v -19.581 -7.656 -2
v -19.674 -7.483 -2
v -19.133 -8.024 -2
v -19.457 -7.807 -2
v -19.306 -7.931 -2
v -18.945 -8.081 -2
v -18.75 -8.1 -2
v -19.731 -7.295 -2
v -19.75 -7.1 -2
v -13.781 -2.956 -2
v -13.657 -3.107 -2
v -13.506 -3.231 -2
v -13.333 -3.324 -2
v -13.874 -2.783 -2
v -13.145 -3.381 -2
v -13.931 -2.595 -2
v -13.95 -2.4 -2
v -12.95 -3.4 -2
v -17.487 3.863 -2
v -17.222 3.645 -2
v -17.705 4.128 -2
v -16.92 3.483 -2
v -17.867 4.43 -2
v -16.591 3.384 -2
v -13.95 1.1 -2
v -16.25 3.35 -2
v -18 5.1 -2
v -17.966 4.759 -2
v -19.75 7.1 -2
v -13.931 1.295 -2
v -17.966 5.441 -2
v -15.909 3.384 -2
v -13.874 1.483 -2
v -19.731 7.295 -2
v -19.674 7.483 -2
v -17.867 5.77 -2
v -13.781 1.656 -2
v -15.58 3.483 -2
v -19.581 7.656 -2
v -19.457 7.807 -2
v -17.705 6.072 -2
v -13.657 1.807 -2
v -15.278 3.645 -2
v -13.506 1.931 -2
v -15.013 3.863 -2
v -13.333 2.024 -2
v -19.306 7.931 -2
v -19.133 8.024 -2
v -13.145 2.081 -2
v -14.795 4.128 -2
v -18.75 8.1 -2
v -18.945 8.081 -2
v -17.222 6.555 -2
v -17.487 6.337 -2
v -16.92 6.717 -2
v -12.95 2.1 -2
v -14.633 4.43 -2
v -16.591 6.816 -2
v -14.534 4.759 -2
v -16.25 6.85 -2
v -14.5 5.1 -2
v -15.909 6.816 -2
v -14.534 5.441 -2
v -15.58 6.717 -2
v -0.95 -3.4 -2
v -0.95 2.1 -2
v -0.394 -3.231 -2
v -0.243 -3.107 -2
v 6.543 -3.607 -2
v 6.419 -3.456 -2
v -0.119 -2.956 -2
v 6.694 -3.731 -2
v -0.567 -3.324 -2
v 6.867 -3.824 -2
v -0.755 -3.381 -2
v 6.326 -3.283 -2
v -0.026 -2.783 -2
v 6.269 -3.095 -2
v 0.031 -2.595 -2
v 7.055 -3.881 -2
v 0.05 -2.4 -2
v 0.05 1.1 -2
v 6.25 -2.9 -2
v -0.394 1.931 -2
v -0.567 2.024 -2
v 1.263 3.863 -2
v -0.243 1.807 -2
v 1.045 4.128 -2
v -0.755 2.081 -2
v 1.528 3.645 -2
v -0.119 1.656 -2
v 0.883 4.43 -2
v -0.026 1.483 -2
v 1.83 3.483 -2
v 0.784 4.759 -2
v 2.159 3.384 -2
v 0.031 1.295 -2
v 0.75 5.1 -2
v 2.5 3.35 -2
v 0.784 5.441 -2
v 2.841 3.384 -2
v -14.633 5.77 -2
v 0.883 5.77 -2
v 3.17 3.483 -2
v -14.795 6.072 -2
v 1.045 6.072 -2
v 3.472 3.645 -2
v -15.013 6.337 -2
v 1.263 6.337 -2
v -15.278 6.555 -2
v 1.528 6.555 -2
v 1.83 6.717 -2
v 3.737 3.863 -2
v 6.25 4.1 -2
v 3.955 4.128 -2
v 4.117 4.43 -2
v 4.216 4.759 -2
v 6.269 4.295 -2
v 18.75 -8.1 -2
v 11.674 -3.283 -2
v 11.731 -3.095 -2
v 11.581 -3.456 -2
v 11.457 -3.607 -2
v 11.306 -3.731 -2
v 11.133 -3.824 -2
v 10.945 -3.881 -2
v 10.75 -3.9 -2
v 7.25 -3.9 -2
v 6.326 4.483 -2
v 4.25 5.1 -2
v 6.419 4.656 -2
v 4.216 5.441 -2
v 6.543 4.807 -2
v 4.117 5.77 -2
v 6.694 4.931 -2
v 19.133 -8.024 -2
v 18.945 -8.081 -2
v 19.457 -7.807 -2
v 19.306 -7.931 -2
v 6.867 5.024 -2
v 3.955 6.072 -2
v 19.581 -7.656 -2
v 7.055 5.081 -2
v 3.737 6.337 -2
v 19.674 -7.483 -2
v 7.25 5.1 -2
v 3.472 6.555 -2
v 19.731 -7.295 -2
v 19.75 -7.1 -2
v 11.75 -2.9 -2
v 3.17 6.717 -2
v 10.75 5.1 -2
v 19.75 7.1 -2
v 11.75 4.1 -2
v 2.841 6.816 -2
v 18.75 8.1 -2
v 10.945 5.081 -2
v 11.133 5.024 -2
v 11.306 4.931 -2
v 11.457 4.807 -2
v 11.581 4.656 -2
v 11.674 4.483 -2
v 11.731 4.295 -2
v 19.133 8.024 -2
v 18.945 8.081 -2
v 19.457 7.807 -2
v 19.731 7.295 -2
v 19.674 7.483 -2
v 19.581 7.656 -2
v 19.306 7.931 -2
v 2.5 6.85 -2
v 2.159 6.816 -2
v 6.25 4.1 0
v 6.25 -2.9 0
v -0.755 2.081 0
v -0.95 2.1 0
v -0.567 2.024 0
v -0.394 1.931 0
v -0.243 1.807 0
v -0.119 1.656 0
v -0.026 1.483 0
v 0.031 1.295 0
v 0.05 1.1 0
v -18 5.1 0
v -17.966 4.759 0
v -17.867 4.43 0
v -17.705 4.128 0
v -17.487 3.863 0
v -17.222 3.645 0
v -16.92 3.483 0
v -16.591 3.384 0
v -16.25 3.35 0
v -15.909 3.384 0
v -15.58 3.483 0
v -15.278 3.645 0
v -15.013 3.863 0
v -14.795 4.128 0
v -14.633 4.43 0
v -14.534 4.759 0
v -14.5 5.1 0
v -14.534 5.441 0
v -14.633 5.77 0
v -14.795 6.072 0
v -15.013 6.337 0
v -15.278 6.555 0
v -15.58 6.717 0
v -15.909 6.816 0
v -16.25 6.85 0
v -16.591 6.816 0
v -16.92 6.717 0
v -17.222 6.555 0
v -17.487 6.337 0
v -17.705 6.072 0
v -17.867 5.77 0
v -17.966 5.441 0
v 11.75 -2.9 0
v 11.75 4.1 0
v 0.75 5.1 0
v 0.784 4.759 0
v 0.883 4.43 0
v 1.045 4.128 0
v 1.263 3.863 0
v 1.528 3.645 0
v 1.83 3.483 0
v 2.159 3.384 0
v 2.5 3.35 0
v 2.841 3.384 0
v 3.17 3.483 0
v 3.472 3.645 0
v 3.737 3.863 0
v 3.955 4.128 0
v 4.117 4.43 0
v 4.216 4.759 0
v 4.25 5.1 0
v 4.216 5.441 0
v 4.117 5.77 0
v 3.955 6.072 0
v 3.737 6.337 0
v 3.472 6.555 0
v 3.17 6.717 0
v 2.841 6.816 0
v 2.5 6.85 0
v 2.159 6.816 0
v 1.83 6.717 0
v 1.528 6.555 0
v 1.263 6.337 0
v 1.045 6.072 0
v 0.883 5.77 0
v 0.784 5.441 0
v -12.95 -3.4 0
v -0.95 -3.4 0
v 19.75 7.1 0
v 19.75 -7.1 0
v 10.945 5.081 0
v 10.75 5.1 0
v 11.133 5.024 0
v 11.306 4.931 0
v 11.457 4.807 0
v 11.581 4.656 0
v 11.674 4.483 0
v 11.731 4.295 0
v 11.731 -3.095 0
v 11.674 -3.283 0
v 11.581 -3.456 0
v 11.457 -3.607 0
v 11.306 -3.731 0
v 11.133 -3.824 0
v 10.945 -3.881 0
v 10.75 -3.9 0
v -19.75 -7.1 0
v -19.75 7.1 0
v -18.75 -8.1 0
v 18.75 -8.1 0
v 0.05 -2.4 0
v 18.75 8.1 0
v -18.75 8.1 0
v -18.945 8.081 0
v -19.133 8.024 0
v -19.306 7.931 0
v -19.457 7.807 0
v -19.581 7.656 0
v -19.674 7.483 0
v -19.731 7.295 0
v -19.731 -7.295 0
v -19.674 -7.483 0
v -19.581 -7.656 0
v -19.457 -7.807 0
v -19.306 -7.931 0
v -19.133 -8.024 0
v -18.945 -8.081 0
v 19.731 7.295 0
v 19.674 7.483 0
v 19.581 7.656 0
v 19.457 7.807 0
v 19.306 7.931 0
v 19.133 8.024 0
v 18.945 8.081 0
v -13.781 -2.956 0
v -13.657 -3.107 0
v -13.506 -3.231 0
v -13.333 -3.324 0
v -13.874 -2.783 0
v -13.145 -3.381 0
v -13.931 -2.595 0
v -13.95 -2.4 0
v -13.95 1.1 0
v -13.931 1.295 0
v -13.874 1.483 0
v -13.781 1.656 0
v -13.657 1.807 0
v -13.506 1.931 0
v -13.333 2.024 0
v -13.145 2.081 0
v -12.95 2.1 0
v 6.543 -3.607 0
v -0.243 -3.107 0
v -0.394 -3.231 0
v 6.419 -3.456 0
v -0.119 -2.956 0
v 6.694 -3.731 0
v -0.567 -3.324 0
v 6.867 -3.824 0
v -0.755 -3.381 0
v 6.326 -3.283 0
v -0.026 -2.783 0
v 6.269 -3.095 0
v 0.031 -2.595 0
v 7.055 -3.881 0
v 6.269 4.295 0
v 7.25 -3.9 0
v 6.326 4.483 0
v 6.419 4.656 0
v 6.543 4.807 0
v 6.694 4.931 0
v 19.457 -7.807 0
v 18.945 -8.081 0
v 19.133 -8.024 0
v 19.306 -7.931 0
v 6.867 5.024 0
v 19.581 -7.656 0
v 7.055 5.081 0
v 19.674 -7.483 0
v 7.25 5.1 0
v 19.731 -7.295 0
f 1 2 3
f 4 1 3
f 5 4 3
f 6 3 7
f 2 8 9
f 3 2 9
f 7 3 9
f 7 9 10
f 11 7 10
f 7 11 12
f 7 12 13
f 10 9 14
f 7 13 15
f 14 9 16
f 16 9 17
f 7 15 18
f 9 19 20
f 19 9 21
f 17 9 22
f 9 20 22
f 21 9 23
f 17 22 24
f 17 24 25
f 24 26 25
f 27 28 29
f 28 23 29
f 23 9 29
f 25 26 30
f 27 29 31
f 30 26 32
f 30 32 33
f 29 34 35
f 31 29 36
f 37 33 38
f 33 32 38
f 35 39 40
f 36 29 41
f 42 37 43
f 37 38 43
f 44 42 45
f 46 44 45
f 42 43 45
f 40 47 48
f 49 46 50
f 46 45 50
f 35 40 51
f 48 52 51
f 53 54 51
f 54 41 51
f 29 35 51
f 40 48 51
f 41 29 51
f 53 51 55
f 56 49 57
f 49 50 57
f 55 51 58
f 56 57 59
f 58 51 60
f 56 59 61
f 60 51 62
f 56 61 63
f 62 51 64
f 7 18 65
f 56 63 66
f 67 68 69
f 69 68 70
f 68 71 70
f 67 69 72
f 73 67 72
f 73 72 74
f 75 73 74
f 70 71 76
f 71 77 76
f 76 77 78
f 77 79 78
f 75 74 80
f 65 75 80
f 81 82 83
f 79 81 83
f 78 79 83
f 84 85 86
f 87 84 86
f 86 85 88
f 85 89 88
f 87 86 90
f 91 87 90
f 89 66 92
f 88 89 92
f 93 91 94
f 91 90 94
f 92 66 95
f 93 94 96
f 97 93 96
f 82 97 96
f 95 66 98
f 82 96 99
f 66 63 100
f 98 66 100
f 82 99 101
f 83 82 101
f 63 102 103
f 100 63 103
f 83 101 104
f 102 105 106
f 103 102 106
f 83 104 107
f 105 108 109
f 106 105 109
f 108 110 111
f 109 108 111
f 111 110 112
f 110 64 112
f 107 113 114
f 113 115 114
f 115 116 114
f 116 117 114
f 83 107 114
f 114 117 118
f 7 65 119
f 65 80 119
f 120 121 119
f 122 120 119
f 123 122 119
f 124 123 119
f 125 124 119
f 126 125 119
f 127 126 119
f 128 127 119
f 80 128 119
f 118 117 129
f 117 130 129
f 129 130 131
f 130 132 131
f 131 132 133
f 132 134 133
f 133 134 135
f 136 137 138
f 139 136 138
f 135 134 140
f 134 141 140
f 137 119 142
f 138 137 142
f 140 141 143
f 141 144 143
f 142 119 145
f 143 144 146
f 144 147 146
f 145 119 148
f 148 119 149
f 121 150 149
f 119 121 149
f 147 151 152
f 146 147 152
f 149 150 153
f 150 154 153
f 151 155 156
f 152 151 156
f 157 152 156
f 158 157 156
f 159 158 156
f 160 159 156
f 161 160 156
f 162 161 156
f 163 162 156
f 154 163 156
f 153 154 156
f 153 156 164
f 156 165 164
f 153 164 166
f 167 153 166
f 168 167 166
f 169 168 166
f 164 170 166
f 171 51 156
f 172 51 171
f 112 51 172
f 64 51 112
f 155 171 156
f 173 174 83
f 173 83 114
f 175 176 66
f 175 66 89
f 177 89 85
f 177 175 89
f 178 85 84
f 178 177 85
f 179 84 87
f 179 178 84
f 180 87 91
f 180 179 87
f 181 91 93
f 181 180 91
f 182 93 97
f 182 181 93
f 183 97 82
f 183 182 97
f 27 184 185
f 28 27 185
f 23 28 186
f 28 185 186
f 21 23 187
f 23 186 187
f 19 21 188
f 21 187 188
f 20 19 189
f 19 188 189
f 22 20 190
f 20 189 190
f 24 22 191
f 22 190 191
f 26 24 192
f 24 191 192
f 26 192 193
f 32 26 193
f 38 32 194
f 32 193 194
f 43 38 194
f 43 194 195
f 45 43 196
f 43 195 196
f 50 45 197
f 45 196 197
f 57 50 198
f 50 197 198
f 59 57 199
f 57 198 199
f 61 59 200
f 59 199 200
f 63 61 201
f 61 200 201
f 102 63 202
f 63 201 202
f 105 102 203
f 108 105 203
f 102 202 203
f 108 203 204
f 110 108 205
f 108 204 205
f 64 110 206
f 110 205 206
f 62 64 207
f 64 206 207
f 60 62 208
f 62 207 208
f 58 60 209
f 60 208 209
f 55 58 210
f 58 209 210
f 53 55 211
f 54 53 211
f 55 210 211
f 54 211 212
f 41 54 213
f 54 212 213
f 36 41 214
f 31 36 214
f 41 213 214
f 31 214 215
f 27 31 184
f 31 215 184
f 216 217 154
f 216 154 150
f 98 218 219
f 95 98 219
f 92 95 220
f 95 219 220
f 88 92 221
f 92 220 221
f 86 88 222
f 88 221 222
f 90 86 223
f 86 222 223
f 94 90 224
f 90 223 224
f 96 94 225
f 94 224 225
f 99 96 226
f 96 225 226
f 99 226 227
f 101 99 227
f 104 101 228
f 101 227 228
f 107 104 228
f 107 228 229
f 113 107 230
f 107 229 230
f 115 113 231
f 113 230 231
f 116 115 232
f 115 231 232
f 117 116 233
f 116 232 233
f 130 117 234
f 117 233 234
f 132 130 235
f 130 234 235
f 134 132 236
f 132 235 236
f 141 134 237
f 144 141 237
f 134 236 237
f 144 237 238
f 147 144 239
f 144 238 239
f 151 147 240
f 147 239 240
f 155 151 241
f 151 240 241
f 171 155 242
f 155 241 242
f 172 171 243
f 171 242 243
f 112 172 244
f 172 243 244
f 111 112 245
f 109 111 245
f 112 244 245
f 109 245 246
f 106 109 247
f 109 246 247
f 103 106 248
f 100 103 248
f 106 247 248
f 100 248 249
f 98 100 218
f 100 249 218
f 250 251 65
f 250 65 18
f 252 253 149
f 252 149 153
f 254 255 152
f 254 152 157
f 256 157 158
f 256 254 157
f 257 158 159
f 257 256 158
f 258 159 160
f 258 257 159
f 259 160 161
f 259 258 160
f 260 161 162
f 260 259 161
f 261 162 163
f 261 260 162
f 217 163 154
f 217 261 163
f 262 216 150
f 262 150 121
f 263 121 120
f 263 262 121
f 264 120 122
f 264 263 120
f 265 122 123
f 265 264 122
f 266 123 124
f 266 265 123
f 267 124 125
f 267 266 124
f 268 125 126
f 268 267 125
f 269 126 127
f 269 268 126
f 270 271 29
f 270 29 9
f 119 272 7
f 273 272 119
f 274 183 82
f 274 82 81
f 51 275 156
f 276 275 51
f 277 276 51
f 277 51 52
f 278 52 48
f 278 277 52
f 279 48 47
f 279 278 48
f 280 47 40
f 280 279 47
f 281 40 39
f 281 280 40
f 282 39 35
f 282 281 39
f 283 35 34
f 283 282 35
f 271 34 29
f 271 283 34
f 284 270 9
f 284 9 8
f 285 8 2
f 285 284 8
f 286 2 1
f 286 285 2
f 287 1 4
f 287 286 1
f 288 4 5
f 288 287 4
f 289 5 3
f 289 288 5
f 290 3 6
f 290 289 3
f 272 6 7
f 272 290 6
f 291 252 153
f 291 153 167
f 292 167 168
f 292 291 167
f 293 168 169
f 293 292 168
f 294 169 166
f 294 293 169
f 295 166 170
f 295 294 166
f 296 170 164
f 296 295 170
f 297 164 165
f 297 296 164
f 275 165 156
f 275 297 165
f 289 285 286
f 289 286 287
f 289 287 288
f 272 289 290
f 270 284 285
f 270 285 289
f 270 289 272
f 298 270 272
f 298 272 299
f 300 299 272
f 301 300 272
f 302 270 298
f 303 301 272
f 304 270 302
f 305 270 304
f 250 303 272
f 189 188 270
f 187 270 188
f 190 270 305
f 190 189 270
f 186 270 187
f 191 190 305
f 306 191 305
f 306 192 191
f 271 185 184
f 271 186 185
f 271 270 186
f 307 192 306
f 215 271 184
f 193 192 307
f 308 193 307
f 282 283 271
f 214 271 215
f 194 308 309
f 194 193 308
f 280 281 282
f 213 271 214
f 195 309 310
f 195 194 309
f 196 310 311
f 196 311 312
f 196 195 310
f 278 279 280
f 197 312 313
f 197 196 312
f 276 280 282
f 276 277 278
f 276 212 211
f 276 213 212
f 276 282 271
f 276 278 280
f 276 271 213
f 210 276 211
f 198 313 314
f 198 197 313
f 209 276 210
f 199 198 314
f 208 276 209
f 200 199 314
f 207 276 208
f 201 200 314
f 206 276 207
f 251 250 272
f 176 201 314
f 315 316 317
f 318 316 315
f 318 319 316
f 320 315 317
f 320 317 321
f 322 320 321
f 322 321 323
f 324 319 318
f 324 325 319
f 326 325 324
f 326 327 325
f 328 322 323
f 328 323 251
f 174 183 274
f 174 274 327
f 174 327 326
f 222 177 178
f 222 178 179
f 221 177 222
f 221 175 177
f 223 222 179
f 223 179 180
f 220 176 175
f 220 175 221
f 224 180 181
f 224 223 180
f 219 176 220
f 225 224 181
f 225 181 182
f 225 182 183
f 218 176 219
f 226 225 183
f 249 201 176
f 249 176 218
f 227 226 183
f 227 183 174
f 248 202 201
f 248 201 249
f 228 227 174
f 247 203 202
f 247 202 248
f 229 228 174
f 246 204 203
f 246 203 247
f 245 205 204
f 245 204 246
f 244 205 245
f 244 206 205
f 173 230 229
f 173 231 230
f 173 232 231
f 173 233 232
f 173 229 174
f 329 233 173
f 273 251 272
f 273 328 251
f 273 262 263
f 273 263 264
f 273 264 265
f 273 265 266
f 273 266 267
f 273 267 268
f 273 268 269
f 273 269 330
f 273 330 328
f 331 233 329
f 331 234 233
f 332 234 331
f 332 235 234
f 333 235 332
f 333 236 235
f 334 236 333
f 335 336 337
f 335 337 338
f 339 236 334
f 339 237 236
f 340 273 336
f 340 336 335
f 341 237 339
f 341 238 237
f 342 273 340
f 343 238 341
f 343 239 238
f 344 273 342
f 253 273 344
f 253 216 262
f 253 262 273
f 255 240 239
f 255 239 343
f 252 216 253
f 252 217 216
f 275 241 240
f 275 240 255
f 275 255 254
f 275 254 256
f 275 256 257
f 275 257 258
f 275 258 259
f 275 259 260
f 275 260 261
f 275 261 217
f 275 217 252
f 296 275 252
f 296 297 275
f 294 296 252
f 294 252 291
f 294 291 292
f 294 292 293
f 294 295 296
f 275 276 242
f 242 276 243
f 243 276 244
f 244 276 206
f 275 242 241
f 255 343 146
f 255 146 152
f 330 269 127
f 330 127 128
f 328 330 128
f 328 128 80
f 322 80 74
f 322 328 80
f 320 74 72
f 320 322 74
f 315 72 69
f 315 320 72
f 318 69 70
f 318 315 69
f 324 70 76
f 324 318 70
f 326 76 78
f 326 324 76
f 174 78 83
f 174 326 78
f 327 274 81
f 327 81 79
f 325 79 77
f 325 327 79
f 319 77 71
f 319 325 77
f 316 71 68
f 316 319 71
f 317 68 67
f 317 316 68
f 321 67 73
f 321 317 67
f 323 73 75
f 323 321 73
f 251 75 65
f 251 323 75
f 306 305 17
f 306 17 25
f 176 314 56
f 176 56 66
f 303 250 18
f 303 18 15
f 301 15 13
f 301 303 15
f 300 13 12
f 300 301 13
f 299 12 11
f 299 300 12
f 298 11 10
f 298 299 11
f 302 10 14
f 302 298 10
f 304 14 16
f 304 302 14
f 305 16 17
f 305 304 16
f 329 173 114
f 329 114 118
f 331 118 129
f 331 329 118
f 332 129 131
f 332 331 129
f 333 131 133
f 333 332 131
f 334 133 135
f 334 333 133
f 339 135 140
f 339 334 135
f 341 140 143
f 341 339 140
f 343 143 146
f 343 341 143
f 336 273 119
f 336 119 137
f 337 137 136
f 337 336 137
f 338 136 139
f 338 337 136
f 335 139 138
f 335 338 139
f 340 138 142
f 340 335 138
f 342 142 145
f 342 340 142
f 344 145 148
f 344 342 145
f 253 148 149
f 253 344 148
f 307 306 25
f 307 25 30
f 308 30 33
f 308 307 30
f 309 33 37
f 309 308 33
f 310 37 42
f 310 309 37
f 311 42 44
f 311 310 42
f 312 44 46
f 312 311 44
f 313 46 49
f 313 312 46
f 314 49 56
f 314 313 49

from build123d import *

# Parameters (mm, degrees)
SKETCH1_R           = 1.75
BOSS_EXTRUDE1_DEPTH = 2


with BuildPart() as part:
    # Sketch1 → Boss-Extrude1 (new body)
    with BuildSketch(Plane.XY):
        with BuildLine():
            Line((-19.75, 7.1), (-19.75, -7.1))
            ThreePointArc((-19.75, -7.1), (-19.457106781, -7.807106781), (-18.75, -8.1))
            Line((-18.75, -8.1), (18.75, -8.1))
            ThreePointArc((18.75, -8.1), (19.457106781, -7.807106781), (19.75, -7.1))
            Line((19.75, -7.1), (19.75, 7.1))
            ThreePointArc((19.75, 7.1), (19.457106781, 7.807106781), (18.75, 8.1))
            Line((18.75, 8.1), (-18.75, 8.1))
            ThreePointArc((-18.75, 8.1), (-19.457106781, 7.807106781), (-19.75, 7.1))
        make_face()
        with Locations(Location((-16.25, 5.1, 0), (0, 0, 180))):
            Circle(SKETCH1_R, mode=Mode.SUBTRACT)
        with Locations(Location((2.5, 5.1, 0), (0, 0, 180))):
            Circle(SKETCH1_R, mode=Mode.SUBTRACT)
        with BuildLine():
            Line((7.25, 5.1), (10.75, 5.1))
            ThreePointArc((10.75, 5.1), (11.457106781, 4.807106781), (11.75, 4.1))
            Line((11.75, 4.1), (11.75, -2.9))
            ThreePointArc((11.75, -2.9), (11.457106781, -3.607106781), (10.75, -3.9))
            Line((10.75, -3.9), (7.25, -3.9))
            ThreePointArc((7.25, -3.9), (6.542893219, -3.607106781), (6.25, -2.9))
            Line((6.25, -2.9), (6.25, 4.1))
            ThreePointArc((6.25, 4.1), (6.542893219, 4.807106781), (7.25, 5.1))
        make_face(mode=Mode.SUBTRACT)
        with BuildLine():
            Line((-12.95, 2.1), (-0.95, 2.1))
            ThreePointArc((-0.95, 2.1), (-0.242893219, 1.807106781), (0.05, 1.1))
            Line((0.05, 1.1), (0.05, -2.4))
            ThreePointArc((0.05, -2.4), (-0.242893219, -3.107106781), (-0.95, -3.4))
            Line((-0.95, -3.4), (-12.95, -3.4))
            ThreePointArc((-12.95, -3.4), (-13.657106781, -3.107106781), (-13.95, -2.4))
            Line((-13.95, -2.4), (-13.95, 1.1))
            ThreePointArc((-13.95, 1.1), (-13.657106781, 1.807106781), (-12.95, 2.1))
        make_face(mode=Mode.SUBTRACT)
    extrude(amount=-BOSS_EXTRUDE1_DEPTH)


solid = part.part
